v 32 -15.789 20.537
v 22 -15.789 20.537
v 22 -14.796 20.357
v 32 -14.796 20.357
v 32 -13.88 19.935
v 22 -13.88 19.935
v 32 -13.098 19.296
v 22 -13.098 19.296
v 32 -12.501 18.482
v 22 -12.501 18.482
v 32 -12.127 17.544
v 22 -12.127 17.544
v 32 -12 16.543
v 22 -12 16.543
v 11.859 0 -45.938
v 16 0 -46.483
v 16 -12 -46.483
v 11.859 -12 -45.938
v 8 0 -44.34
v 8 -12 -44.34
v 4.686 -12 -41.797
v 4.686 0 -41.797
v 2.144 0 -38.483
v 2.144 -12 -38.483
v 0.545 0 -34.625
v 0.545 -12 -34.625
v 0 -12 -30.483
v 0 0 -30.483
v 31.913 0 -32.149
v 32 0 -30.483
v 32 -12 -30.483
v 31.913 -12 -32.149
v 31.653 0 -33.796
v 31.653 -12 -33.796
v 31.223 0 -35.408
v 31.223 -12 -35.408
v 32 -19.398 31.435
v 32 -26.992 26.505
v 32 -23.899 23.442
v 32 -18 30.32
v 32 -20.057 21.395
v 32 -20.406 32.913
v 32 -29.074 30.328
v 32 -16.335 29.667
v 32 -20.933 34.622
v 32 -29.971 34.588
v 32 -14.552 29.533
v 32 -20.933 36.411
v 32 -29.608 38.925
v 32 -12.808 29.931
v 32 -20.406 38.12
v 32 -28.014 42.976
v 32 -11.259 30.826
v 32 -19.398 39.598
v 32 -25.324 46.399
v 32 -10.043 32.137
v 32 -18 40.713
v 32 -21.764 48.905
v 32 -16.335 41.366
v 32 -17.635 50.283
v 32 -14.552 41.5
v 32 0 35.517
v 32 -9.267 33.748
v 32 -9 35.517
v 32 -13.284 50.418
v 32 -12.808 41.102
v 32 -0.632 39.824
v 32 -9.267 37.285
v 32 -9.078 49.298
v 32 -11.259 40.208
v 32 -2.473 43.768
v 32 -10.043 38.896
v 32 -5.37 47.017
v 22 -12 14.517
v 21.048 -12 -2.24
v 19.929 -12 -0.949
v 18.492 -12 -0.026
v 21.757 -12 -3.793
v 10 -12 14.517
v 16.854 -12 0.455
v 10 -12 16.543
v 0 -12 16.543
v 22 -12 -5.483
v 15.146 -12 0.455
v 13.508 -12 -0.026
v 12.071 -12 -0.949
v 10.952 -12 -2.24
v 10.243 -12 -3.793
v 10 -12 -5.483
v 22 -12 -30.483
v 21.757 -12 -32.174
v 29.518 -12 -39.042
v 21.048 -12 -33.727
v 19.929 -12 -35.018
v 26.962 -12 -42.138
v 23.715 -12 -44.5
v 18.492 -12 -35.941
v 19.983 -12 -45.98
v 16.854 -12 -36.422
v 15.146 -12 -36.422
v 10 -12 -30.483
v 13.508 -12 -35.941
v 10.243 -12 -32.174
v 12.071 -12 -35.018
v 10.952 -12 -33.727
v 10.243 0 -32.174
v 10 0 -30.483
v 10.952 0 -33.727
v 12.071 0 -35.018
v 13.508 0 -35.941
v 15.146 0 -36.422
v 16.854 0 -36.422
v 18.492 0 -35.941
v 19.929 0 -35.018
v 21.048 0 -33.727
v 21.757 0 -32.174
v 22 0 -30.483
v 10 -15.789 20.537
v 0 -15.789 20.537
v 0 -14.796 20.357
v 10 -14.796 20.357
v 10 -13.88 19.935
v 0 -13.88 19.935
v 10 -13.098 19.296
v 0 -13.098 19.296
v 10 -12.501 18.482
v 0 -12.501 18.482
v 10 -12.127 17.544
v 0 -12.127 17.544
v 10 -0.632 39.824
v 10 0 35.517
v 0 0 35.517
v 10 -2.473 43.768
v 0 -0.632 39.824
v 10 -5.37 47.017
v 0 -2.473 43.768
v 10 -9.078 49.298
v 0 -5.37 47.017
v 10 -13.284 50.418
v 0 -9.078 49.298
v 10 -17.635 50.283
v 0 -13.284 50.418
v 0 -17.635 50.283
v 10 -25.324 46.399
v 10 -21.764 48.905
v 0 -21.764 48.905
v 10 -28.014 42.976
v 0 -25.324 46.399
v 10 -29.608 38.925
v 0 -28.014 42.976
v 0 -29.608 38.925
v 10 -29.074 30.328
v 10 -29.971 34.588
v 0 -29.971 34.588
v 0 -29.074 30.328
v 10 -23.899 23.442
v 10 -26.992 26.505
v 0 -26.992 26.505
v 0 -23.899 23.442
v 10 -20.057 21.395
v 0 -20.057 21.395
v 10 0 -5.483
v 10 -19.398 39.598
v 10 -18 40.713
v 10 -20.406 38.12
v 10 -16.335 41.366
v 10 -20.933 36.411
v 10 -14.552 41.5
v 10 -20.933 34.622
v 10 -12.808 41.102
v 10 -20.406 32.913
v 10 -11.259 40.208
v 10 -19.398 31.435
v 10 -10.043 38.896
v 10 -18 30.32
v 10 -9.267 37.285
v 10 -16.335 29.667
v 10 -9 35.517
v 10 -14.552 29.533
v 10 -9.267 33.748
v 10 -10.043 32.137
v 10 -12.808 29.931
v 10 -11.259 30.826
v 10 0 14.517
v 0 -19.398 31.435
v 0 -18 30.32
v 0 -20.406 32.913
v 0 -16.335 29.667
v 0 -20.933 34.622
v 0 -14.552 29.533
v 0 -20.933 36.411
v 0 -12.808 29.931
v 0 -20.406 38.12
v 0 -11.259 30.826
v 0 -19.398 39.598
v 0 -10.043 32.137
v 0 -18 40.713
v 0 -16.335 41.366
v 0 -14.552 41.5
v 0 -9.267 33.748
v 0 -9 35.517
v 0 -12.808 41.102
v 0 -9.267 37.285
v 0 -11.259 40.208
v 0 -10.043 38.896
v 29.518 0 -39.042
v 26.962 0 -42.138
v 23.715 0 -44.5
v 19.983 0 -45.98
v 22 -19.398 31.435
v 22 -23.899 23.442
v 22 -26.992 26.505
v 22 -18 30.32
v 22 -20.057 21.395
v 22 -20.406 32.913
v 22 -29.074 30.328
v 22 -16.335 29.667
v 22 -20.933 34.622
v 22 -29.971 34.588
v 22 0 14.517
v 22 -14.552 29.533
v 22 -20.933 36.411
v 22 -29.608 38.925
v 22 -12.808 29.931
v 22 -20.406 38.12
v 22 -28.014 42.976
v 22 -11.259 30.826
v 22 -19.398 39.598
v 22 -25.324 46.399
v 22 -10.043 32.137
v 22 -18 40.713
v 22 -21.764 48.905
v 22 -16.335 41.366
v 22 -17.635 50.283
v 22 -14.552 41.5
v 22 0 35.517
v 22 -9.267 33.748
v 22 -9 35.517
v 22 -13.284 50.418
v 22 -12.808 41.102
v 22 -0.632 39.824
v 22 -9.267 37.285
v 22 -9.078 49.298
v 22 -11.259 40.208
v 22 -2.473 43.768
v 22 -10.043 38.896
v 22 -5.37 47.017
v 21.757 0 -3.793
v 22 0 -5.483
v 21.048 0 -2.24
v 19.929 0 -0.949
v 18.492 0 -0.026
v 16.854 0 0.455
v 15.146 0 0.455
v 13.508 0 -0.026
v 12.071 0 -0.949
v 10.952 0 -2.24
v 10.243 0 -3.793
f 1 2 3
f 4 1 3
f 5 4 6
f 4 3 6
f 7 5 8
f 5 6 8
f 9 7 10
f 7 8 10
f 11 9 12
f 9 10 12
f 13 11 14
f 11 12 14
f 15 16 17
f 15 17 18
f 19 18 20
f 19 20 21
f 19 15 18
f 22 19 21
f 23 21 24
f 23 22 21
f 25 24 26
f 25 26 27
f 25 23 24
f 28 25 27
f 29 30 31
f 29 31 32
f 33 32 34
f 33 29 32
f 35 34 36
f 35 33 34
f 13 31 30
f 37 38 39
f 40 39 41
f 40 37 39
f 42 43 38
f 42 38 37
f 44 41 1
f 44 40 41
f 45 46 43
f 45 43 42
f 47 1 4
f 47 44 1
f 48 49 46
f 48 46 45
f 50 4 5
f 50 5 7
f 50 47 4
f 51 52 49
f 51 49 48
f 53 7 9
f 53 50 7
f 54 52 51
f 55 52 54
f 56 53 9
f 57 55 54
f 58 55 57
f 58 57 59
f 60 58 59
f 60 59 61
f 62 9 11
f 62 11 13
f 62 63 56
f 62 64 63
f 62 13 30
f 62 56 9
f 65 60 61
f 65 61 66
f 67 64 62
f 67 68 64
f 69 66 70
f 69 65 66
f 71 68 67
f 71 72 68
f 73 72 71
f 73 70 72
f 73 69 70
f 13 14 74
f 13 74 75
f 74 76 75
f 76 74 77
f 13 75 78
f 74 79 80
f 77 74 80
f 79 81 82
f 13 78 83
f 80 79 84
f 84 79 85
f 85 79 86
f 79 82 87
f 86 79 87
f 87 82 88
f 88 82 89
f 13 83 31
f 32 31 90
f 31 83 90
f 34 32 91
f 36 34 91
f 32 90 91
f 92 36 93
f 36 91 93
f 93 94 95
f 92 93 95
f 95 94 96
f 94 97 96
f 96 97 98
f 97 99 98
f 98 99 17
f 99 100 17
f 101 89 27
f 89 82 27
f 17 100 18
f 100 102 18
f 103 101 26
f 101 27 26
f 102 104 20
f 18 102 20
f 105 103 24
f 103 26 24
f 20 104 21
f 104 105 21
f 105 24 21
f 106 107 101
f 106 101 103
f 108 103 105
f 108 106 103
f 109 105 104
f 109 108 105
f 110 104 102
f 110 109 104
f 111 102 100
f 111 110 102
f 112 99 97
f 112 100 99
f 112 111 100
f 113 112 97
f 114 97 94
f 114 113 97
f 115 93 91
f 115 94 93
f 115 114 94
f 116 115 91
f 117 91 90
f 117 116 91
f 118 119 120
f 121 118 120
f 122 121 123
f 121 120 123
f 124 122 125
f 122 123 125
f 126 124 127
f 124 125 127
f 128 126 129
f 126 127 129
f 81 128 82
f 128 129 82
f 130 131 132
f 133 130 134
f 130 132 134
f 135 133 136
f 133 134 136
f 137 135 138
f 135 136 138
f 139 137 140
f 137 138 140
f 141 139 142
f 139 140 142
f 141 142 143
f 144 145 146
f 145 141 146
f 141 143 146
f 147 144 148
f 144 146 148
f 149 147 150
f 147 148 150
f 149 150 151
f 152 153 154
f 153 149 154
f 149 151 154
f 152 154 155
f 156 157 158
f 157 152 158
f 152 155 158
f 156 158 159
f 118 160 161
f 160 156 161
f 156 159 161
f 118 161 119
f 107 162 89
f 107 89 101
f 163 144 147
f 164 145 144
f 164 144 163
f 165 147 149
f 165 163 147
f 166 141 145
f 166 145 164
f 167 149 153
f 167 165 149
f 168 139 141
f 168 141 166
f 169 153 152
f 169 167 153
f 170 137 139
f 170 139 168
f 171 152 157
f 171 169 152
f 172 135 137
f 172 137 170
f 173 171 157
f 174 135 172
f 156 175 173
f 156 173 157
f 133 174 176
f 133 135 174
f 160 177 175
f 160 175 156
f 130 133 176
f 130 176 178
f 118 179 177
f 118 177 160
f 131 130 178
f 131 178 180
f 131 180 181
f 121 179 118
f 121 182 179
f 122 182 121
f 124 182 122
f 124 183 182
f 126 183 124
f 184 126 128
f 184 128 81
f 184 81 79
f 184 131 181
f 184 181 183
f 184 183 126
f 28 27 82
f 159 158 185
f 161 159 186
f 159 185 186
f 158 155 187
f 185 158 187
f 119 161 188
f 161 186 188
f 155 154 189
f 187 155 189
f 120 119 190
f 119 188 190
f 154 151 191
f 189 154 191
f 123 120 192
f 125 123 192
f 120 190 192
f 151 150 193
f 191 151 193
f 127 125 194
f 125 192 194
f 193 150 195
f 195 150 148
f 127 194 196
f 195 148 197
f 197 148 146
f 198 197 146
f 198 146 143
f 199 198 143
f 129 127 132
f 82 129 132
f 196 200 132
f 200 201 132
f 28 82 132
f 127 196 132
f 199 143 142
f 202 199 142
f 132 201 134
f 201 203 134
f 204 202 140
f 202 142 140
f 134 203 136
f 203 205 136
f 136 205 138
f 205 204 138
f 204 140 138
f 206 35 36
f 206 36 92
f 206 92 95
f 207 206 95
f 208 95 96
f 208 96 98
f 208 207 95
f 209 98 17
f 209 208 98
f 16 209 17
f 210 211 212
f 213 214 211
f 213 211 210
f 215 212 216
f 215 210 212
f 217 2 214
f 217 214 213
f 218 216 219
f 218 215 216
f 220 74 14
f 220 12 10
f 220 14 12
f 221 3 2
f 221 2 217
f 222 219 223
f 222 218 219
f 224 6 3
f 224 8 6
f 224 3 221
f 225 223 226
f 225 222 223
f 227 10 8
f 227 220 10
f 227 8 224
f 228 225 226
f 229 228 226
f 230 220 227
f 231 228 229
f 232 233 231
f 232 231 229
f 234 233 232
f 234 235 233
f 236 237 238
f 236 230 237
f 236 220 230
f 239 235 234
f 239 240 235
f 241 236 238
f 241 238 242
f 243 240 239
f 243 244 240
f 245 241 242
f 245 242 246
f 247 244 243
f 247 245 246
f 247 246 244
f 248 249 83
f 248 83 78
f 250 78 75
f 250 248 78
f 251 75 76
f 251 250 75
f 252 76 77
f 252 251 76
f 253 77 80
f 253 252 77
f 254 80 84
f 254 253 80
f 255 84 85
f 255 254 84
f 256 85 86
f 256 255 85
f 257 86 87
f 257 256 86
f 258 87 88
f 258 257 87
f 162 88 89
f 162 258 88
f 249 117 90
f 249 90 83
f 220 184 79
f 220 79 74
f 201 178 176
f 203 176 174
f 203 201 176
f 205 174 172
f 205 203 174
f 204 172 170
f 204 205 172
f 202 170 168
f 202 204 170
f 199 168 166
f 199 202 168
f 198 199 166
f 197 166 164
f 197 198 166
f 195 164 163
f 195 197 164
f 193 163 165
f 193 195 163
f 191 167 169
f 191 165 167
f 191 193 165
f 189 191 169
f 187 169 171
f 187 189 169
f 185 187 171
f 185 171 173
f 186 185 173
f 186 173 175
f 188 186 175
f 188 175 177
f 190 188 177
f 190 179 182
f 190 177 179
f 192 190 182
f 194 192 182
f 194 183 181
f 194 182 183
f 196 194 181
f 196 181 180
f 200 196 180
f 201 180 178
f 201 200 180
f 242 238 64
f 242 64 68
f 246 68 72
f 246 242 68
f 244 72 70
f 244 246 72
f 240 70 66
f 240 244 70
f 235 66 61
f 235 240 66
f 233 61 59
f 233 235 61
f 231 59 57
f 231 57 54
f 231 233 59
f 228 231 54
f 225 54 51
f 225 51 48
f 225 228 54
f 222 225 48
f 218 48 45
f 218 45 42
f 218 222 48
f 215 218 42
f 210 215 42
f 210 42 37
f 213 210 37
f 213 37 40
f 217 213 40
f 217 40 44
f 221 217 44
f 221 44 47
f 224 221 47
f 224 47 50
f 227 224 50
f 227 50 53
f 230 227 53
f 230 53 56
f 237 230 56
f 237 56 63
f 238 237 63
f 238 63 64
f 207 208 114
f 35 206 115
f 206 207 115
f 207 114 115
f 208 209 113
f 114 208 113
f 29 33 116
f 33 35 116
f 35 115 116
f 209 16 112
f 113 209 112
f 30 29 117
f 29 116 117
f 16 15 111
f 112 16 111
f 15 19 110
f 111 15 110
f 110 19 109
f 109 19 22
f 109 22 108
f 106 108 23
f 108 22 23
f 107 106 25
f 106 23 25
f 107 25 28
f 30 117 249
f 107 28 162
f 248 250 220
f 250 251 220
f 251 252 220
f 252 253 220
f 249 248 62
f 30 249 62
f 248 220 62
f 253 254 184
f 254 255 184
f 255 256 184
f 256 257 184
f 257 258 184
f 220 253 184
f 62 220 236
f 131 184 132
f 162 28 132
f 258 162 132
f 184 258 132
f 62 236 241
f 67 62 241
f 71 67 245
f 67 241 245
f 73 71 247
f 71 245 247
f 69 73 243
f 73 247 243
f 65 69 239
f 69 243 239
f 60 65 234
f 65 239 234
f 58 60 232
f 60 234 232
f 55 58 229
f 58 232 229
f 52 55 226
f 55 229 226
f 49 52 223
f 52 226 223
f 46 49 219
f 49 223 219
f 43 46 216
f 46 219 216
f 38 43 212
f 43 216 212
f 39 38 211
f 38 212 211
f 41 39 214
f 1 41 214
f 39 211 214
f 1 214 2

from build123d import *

# Parameters (mm, degrees)
F0_R     = 6
F1_DEPTH = 32
F2_W     = 12
F2_H     = 15
F2_H_2   = 2.026334039
F3_DEPTH = 30.001


with BuildPart() as f1:
    # F0 (on Right) → F1 (new body)
    with BuildSketch(Plane.YZ):
        with BuildLine():
            Line((0, -46.4834831254), (0, 35.5165168746))
            ThreePointArc((0, 35.5165168746), (-25.3237080242, 46.3986606262), (-15.7894736842, 20.5373069054))
            ThreePointArc((-15.7894736842, 20.5373069054), (-13.0980949996, 19.29583972), (-12, 16.5428509136))
            Line((-12, 16.5428509136), (-12, -46.4834831254))
            Line((-12, -46.4834831254), (0, -46.4834831254))
        make_face()
        with Locations((-15, 35.5165168746)):
            Circle(F0_R, mode=Mode.SUBTRACT)
    extrude(amount=F1_DEPTH)

    # F2 (on Front) → F3 (cut, through all)
    with BuildSketch(Plane.XZ):
        Polygon((10, 16.5428509136), (22, 16.5428509136), (22, 35.5165168746), (10, 35.5165168746), (10, 20.5373069054), align=None)
        with Locations((16, 43.0165168746)):
            Rectangle(F2_W, F2_H)
        with Locations((16, 15.5296838941)):
            Rectangle(F2_W, F2_H_2)
        with BuildLine():
            Line((10, -5.4834831254), (10, -30.4834831254))
            ThreePointArc((10, -30.4834831254), (16, -36.4834831254), (22, -30.4834831254))
            Line((22, -30.4834831254), (22, -5.4834831254))
            ThreePointArc((22, -5.4834831254), (16, 0.5165168746), (10, -5.4834831254))
        make_face()
        with BuildLine():
            Line((16.0000000715, -46.4834831254), (32, -46.4834831254))
            Line((32, -46.4834831254), (32, -30.4834831254))
            ThreePointArc((32, -30.4834831254), (31.8046622717, -32.9760020276), (31.2234186903, -35.4076605573))
            ThreePointArc((31.2234186903, -35.4076605573), (25.4131068776, -43.4215439891), (16.0000000715, -46.4834831254))
        make_face()
        with BuildLine():
            Line((0, -46.4834831254), (16.0000000715, -46.4834831254))
            ThreePointArc((16.0000000715, -46.4834831254), (4.6862915263, -41.7971916497), (0, -30.4834831254))
            Line((0, -30.4834831254), (0, -46.4834831254))
        make_face()
    extrude(amount=F3_DEPTH, mode=Mode.SUBTRACT)


solid = f1.part
